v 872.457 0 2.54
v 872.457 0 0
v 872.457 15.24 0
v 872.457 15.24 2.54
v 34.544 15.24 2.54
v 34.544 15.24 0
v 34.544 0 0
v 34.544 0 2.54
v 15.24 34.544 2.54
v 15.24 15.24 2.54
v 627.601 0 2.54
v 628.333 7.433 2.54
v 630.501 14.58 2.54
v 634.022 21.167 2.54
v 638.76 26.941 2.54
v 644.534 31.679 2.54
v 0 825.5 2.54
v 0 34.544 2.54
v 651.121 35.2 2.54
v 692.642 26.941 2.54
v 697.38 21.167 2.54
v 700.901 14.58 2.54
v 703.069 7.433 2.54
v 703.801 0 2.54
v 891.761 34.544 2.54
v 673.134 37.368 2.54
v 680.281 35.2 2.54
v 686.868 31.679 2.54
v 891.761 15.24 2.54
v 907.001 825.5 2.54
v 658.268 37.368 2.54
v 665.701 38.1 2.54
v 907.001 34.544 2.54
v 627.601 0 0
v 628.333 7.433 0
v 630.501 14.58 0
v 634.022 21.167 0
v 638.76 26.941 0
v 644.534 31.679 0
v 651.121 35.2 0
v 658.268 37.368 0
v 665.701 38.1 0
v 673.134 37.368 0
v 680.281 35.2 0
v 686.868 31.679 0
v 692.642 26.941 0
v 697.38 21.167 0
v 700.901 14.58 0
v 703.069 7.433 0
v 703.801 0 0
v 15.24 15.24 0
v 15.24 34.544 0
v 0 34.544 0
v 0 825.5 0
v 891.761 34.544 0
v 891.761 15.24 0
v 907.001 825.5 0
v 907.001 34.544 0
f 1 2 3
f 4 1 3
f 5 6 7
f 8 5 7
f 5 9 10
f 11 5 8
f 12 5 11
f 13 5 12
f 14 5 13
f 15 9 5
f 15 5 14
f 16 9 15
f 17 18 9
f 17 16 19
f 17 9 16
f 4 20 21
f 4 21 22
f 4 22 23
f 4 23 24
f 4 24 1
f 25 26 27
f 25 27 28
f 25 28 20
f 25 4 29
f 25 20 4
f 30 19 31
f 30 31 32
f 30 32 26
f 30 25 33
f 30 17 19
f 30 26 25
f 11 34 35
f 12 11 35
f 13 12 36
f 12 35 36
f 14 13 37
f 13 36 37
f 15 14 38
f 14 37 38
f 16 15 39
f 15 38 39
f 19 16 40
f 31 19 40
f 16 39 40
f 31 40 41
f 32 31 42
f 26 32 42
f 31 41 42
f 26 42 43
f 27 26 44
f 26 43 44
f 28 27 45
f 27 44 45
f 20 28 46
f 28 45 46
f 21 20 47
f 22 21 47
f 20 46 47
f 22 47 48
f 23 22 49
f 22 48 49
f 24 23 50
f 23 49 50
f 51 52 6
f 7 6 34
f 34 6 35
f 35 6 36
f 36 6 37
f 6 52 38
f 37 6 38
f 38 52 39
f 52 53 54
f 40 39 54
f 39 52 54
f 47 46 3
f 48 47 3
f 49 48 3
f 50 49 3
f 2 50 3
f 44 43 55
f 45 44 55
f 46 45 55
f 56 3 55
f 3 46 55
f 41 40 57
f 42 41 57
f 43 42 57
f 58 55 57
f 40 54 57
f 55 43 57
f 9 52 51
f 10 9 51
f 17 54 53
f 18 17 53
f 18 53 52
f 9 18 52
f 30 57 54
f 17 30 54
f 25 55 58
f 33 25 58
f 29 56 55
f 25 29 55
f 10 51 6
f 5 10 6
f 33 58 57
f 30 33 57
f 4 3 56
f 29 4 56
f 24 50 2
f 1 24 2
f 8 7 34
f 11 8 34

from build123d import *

# Parameters (mm, degrees)
BOSS_EXTRUDE1_DEPTH = 2.54


with BuildPart() as part:
    # Sketch1 → Boss-Extrude1 (new body)
    with BuildSketch(Plane.XY):
        with BuildLine():
            Line((0, 825.5), (0, 34.544))
            Line((0, 34.544), (15.24, 34.544))
            Line((15.24, 34.544), (15.24, 15.24))
            Line((15.24, 15.24), (34.544, 15.24))
            Line((34.544, 15.24), (34.544, 0))
            Line((34.544, 0), (627.60098, 0))
            ThreePointArc((627.60098, 0), (665.70098, 38.1), (703.80098, 0))
            Line((703.80098, 0), (872.45698, 0))
            Line((872.45698, 0), (872.45698, 15.24))
            Line((872.45698, 15.24), (891.76098, 15.24))
            Line((891.76098, 15.24), (891.76098, 34.544))
            Line((891.76098, 34.544), (907.00098, 34.544))
            Line((907.00098, 34.544), (907.00098, 825.5))
            Line((907.00098, 825.5), (0, 825.5))
        make_face()
    extrude(amount=BOSS_EXTRUDE1_DEPTH)


solid = part.part
